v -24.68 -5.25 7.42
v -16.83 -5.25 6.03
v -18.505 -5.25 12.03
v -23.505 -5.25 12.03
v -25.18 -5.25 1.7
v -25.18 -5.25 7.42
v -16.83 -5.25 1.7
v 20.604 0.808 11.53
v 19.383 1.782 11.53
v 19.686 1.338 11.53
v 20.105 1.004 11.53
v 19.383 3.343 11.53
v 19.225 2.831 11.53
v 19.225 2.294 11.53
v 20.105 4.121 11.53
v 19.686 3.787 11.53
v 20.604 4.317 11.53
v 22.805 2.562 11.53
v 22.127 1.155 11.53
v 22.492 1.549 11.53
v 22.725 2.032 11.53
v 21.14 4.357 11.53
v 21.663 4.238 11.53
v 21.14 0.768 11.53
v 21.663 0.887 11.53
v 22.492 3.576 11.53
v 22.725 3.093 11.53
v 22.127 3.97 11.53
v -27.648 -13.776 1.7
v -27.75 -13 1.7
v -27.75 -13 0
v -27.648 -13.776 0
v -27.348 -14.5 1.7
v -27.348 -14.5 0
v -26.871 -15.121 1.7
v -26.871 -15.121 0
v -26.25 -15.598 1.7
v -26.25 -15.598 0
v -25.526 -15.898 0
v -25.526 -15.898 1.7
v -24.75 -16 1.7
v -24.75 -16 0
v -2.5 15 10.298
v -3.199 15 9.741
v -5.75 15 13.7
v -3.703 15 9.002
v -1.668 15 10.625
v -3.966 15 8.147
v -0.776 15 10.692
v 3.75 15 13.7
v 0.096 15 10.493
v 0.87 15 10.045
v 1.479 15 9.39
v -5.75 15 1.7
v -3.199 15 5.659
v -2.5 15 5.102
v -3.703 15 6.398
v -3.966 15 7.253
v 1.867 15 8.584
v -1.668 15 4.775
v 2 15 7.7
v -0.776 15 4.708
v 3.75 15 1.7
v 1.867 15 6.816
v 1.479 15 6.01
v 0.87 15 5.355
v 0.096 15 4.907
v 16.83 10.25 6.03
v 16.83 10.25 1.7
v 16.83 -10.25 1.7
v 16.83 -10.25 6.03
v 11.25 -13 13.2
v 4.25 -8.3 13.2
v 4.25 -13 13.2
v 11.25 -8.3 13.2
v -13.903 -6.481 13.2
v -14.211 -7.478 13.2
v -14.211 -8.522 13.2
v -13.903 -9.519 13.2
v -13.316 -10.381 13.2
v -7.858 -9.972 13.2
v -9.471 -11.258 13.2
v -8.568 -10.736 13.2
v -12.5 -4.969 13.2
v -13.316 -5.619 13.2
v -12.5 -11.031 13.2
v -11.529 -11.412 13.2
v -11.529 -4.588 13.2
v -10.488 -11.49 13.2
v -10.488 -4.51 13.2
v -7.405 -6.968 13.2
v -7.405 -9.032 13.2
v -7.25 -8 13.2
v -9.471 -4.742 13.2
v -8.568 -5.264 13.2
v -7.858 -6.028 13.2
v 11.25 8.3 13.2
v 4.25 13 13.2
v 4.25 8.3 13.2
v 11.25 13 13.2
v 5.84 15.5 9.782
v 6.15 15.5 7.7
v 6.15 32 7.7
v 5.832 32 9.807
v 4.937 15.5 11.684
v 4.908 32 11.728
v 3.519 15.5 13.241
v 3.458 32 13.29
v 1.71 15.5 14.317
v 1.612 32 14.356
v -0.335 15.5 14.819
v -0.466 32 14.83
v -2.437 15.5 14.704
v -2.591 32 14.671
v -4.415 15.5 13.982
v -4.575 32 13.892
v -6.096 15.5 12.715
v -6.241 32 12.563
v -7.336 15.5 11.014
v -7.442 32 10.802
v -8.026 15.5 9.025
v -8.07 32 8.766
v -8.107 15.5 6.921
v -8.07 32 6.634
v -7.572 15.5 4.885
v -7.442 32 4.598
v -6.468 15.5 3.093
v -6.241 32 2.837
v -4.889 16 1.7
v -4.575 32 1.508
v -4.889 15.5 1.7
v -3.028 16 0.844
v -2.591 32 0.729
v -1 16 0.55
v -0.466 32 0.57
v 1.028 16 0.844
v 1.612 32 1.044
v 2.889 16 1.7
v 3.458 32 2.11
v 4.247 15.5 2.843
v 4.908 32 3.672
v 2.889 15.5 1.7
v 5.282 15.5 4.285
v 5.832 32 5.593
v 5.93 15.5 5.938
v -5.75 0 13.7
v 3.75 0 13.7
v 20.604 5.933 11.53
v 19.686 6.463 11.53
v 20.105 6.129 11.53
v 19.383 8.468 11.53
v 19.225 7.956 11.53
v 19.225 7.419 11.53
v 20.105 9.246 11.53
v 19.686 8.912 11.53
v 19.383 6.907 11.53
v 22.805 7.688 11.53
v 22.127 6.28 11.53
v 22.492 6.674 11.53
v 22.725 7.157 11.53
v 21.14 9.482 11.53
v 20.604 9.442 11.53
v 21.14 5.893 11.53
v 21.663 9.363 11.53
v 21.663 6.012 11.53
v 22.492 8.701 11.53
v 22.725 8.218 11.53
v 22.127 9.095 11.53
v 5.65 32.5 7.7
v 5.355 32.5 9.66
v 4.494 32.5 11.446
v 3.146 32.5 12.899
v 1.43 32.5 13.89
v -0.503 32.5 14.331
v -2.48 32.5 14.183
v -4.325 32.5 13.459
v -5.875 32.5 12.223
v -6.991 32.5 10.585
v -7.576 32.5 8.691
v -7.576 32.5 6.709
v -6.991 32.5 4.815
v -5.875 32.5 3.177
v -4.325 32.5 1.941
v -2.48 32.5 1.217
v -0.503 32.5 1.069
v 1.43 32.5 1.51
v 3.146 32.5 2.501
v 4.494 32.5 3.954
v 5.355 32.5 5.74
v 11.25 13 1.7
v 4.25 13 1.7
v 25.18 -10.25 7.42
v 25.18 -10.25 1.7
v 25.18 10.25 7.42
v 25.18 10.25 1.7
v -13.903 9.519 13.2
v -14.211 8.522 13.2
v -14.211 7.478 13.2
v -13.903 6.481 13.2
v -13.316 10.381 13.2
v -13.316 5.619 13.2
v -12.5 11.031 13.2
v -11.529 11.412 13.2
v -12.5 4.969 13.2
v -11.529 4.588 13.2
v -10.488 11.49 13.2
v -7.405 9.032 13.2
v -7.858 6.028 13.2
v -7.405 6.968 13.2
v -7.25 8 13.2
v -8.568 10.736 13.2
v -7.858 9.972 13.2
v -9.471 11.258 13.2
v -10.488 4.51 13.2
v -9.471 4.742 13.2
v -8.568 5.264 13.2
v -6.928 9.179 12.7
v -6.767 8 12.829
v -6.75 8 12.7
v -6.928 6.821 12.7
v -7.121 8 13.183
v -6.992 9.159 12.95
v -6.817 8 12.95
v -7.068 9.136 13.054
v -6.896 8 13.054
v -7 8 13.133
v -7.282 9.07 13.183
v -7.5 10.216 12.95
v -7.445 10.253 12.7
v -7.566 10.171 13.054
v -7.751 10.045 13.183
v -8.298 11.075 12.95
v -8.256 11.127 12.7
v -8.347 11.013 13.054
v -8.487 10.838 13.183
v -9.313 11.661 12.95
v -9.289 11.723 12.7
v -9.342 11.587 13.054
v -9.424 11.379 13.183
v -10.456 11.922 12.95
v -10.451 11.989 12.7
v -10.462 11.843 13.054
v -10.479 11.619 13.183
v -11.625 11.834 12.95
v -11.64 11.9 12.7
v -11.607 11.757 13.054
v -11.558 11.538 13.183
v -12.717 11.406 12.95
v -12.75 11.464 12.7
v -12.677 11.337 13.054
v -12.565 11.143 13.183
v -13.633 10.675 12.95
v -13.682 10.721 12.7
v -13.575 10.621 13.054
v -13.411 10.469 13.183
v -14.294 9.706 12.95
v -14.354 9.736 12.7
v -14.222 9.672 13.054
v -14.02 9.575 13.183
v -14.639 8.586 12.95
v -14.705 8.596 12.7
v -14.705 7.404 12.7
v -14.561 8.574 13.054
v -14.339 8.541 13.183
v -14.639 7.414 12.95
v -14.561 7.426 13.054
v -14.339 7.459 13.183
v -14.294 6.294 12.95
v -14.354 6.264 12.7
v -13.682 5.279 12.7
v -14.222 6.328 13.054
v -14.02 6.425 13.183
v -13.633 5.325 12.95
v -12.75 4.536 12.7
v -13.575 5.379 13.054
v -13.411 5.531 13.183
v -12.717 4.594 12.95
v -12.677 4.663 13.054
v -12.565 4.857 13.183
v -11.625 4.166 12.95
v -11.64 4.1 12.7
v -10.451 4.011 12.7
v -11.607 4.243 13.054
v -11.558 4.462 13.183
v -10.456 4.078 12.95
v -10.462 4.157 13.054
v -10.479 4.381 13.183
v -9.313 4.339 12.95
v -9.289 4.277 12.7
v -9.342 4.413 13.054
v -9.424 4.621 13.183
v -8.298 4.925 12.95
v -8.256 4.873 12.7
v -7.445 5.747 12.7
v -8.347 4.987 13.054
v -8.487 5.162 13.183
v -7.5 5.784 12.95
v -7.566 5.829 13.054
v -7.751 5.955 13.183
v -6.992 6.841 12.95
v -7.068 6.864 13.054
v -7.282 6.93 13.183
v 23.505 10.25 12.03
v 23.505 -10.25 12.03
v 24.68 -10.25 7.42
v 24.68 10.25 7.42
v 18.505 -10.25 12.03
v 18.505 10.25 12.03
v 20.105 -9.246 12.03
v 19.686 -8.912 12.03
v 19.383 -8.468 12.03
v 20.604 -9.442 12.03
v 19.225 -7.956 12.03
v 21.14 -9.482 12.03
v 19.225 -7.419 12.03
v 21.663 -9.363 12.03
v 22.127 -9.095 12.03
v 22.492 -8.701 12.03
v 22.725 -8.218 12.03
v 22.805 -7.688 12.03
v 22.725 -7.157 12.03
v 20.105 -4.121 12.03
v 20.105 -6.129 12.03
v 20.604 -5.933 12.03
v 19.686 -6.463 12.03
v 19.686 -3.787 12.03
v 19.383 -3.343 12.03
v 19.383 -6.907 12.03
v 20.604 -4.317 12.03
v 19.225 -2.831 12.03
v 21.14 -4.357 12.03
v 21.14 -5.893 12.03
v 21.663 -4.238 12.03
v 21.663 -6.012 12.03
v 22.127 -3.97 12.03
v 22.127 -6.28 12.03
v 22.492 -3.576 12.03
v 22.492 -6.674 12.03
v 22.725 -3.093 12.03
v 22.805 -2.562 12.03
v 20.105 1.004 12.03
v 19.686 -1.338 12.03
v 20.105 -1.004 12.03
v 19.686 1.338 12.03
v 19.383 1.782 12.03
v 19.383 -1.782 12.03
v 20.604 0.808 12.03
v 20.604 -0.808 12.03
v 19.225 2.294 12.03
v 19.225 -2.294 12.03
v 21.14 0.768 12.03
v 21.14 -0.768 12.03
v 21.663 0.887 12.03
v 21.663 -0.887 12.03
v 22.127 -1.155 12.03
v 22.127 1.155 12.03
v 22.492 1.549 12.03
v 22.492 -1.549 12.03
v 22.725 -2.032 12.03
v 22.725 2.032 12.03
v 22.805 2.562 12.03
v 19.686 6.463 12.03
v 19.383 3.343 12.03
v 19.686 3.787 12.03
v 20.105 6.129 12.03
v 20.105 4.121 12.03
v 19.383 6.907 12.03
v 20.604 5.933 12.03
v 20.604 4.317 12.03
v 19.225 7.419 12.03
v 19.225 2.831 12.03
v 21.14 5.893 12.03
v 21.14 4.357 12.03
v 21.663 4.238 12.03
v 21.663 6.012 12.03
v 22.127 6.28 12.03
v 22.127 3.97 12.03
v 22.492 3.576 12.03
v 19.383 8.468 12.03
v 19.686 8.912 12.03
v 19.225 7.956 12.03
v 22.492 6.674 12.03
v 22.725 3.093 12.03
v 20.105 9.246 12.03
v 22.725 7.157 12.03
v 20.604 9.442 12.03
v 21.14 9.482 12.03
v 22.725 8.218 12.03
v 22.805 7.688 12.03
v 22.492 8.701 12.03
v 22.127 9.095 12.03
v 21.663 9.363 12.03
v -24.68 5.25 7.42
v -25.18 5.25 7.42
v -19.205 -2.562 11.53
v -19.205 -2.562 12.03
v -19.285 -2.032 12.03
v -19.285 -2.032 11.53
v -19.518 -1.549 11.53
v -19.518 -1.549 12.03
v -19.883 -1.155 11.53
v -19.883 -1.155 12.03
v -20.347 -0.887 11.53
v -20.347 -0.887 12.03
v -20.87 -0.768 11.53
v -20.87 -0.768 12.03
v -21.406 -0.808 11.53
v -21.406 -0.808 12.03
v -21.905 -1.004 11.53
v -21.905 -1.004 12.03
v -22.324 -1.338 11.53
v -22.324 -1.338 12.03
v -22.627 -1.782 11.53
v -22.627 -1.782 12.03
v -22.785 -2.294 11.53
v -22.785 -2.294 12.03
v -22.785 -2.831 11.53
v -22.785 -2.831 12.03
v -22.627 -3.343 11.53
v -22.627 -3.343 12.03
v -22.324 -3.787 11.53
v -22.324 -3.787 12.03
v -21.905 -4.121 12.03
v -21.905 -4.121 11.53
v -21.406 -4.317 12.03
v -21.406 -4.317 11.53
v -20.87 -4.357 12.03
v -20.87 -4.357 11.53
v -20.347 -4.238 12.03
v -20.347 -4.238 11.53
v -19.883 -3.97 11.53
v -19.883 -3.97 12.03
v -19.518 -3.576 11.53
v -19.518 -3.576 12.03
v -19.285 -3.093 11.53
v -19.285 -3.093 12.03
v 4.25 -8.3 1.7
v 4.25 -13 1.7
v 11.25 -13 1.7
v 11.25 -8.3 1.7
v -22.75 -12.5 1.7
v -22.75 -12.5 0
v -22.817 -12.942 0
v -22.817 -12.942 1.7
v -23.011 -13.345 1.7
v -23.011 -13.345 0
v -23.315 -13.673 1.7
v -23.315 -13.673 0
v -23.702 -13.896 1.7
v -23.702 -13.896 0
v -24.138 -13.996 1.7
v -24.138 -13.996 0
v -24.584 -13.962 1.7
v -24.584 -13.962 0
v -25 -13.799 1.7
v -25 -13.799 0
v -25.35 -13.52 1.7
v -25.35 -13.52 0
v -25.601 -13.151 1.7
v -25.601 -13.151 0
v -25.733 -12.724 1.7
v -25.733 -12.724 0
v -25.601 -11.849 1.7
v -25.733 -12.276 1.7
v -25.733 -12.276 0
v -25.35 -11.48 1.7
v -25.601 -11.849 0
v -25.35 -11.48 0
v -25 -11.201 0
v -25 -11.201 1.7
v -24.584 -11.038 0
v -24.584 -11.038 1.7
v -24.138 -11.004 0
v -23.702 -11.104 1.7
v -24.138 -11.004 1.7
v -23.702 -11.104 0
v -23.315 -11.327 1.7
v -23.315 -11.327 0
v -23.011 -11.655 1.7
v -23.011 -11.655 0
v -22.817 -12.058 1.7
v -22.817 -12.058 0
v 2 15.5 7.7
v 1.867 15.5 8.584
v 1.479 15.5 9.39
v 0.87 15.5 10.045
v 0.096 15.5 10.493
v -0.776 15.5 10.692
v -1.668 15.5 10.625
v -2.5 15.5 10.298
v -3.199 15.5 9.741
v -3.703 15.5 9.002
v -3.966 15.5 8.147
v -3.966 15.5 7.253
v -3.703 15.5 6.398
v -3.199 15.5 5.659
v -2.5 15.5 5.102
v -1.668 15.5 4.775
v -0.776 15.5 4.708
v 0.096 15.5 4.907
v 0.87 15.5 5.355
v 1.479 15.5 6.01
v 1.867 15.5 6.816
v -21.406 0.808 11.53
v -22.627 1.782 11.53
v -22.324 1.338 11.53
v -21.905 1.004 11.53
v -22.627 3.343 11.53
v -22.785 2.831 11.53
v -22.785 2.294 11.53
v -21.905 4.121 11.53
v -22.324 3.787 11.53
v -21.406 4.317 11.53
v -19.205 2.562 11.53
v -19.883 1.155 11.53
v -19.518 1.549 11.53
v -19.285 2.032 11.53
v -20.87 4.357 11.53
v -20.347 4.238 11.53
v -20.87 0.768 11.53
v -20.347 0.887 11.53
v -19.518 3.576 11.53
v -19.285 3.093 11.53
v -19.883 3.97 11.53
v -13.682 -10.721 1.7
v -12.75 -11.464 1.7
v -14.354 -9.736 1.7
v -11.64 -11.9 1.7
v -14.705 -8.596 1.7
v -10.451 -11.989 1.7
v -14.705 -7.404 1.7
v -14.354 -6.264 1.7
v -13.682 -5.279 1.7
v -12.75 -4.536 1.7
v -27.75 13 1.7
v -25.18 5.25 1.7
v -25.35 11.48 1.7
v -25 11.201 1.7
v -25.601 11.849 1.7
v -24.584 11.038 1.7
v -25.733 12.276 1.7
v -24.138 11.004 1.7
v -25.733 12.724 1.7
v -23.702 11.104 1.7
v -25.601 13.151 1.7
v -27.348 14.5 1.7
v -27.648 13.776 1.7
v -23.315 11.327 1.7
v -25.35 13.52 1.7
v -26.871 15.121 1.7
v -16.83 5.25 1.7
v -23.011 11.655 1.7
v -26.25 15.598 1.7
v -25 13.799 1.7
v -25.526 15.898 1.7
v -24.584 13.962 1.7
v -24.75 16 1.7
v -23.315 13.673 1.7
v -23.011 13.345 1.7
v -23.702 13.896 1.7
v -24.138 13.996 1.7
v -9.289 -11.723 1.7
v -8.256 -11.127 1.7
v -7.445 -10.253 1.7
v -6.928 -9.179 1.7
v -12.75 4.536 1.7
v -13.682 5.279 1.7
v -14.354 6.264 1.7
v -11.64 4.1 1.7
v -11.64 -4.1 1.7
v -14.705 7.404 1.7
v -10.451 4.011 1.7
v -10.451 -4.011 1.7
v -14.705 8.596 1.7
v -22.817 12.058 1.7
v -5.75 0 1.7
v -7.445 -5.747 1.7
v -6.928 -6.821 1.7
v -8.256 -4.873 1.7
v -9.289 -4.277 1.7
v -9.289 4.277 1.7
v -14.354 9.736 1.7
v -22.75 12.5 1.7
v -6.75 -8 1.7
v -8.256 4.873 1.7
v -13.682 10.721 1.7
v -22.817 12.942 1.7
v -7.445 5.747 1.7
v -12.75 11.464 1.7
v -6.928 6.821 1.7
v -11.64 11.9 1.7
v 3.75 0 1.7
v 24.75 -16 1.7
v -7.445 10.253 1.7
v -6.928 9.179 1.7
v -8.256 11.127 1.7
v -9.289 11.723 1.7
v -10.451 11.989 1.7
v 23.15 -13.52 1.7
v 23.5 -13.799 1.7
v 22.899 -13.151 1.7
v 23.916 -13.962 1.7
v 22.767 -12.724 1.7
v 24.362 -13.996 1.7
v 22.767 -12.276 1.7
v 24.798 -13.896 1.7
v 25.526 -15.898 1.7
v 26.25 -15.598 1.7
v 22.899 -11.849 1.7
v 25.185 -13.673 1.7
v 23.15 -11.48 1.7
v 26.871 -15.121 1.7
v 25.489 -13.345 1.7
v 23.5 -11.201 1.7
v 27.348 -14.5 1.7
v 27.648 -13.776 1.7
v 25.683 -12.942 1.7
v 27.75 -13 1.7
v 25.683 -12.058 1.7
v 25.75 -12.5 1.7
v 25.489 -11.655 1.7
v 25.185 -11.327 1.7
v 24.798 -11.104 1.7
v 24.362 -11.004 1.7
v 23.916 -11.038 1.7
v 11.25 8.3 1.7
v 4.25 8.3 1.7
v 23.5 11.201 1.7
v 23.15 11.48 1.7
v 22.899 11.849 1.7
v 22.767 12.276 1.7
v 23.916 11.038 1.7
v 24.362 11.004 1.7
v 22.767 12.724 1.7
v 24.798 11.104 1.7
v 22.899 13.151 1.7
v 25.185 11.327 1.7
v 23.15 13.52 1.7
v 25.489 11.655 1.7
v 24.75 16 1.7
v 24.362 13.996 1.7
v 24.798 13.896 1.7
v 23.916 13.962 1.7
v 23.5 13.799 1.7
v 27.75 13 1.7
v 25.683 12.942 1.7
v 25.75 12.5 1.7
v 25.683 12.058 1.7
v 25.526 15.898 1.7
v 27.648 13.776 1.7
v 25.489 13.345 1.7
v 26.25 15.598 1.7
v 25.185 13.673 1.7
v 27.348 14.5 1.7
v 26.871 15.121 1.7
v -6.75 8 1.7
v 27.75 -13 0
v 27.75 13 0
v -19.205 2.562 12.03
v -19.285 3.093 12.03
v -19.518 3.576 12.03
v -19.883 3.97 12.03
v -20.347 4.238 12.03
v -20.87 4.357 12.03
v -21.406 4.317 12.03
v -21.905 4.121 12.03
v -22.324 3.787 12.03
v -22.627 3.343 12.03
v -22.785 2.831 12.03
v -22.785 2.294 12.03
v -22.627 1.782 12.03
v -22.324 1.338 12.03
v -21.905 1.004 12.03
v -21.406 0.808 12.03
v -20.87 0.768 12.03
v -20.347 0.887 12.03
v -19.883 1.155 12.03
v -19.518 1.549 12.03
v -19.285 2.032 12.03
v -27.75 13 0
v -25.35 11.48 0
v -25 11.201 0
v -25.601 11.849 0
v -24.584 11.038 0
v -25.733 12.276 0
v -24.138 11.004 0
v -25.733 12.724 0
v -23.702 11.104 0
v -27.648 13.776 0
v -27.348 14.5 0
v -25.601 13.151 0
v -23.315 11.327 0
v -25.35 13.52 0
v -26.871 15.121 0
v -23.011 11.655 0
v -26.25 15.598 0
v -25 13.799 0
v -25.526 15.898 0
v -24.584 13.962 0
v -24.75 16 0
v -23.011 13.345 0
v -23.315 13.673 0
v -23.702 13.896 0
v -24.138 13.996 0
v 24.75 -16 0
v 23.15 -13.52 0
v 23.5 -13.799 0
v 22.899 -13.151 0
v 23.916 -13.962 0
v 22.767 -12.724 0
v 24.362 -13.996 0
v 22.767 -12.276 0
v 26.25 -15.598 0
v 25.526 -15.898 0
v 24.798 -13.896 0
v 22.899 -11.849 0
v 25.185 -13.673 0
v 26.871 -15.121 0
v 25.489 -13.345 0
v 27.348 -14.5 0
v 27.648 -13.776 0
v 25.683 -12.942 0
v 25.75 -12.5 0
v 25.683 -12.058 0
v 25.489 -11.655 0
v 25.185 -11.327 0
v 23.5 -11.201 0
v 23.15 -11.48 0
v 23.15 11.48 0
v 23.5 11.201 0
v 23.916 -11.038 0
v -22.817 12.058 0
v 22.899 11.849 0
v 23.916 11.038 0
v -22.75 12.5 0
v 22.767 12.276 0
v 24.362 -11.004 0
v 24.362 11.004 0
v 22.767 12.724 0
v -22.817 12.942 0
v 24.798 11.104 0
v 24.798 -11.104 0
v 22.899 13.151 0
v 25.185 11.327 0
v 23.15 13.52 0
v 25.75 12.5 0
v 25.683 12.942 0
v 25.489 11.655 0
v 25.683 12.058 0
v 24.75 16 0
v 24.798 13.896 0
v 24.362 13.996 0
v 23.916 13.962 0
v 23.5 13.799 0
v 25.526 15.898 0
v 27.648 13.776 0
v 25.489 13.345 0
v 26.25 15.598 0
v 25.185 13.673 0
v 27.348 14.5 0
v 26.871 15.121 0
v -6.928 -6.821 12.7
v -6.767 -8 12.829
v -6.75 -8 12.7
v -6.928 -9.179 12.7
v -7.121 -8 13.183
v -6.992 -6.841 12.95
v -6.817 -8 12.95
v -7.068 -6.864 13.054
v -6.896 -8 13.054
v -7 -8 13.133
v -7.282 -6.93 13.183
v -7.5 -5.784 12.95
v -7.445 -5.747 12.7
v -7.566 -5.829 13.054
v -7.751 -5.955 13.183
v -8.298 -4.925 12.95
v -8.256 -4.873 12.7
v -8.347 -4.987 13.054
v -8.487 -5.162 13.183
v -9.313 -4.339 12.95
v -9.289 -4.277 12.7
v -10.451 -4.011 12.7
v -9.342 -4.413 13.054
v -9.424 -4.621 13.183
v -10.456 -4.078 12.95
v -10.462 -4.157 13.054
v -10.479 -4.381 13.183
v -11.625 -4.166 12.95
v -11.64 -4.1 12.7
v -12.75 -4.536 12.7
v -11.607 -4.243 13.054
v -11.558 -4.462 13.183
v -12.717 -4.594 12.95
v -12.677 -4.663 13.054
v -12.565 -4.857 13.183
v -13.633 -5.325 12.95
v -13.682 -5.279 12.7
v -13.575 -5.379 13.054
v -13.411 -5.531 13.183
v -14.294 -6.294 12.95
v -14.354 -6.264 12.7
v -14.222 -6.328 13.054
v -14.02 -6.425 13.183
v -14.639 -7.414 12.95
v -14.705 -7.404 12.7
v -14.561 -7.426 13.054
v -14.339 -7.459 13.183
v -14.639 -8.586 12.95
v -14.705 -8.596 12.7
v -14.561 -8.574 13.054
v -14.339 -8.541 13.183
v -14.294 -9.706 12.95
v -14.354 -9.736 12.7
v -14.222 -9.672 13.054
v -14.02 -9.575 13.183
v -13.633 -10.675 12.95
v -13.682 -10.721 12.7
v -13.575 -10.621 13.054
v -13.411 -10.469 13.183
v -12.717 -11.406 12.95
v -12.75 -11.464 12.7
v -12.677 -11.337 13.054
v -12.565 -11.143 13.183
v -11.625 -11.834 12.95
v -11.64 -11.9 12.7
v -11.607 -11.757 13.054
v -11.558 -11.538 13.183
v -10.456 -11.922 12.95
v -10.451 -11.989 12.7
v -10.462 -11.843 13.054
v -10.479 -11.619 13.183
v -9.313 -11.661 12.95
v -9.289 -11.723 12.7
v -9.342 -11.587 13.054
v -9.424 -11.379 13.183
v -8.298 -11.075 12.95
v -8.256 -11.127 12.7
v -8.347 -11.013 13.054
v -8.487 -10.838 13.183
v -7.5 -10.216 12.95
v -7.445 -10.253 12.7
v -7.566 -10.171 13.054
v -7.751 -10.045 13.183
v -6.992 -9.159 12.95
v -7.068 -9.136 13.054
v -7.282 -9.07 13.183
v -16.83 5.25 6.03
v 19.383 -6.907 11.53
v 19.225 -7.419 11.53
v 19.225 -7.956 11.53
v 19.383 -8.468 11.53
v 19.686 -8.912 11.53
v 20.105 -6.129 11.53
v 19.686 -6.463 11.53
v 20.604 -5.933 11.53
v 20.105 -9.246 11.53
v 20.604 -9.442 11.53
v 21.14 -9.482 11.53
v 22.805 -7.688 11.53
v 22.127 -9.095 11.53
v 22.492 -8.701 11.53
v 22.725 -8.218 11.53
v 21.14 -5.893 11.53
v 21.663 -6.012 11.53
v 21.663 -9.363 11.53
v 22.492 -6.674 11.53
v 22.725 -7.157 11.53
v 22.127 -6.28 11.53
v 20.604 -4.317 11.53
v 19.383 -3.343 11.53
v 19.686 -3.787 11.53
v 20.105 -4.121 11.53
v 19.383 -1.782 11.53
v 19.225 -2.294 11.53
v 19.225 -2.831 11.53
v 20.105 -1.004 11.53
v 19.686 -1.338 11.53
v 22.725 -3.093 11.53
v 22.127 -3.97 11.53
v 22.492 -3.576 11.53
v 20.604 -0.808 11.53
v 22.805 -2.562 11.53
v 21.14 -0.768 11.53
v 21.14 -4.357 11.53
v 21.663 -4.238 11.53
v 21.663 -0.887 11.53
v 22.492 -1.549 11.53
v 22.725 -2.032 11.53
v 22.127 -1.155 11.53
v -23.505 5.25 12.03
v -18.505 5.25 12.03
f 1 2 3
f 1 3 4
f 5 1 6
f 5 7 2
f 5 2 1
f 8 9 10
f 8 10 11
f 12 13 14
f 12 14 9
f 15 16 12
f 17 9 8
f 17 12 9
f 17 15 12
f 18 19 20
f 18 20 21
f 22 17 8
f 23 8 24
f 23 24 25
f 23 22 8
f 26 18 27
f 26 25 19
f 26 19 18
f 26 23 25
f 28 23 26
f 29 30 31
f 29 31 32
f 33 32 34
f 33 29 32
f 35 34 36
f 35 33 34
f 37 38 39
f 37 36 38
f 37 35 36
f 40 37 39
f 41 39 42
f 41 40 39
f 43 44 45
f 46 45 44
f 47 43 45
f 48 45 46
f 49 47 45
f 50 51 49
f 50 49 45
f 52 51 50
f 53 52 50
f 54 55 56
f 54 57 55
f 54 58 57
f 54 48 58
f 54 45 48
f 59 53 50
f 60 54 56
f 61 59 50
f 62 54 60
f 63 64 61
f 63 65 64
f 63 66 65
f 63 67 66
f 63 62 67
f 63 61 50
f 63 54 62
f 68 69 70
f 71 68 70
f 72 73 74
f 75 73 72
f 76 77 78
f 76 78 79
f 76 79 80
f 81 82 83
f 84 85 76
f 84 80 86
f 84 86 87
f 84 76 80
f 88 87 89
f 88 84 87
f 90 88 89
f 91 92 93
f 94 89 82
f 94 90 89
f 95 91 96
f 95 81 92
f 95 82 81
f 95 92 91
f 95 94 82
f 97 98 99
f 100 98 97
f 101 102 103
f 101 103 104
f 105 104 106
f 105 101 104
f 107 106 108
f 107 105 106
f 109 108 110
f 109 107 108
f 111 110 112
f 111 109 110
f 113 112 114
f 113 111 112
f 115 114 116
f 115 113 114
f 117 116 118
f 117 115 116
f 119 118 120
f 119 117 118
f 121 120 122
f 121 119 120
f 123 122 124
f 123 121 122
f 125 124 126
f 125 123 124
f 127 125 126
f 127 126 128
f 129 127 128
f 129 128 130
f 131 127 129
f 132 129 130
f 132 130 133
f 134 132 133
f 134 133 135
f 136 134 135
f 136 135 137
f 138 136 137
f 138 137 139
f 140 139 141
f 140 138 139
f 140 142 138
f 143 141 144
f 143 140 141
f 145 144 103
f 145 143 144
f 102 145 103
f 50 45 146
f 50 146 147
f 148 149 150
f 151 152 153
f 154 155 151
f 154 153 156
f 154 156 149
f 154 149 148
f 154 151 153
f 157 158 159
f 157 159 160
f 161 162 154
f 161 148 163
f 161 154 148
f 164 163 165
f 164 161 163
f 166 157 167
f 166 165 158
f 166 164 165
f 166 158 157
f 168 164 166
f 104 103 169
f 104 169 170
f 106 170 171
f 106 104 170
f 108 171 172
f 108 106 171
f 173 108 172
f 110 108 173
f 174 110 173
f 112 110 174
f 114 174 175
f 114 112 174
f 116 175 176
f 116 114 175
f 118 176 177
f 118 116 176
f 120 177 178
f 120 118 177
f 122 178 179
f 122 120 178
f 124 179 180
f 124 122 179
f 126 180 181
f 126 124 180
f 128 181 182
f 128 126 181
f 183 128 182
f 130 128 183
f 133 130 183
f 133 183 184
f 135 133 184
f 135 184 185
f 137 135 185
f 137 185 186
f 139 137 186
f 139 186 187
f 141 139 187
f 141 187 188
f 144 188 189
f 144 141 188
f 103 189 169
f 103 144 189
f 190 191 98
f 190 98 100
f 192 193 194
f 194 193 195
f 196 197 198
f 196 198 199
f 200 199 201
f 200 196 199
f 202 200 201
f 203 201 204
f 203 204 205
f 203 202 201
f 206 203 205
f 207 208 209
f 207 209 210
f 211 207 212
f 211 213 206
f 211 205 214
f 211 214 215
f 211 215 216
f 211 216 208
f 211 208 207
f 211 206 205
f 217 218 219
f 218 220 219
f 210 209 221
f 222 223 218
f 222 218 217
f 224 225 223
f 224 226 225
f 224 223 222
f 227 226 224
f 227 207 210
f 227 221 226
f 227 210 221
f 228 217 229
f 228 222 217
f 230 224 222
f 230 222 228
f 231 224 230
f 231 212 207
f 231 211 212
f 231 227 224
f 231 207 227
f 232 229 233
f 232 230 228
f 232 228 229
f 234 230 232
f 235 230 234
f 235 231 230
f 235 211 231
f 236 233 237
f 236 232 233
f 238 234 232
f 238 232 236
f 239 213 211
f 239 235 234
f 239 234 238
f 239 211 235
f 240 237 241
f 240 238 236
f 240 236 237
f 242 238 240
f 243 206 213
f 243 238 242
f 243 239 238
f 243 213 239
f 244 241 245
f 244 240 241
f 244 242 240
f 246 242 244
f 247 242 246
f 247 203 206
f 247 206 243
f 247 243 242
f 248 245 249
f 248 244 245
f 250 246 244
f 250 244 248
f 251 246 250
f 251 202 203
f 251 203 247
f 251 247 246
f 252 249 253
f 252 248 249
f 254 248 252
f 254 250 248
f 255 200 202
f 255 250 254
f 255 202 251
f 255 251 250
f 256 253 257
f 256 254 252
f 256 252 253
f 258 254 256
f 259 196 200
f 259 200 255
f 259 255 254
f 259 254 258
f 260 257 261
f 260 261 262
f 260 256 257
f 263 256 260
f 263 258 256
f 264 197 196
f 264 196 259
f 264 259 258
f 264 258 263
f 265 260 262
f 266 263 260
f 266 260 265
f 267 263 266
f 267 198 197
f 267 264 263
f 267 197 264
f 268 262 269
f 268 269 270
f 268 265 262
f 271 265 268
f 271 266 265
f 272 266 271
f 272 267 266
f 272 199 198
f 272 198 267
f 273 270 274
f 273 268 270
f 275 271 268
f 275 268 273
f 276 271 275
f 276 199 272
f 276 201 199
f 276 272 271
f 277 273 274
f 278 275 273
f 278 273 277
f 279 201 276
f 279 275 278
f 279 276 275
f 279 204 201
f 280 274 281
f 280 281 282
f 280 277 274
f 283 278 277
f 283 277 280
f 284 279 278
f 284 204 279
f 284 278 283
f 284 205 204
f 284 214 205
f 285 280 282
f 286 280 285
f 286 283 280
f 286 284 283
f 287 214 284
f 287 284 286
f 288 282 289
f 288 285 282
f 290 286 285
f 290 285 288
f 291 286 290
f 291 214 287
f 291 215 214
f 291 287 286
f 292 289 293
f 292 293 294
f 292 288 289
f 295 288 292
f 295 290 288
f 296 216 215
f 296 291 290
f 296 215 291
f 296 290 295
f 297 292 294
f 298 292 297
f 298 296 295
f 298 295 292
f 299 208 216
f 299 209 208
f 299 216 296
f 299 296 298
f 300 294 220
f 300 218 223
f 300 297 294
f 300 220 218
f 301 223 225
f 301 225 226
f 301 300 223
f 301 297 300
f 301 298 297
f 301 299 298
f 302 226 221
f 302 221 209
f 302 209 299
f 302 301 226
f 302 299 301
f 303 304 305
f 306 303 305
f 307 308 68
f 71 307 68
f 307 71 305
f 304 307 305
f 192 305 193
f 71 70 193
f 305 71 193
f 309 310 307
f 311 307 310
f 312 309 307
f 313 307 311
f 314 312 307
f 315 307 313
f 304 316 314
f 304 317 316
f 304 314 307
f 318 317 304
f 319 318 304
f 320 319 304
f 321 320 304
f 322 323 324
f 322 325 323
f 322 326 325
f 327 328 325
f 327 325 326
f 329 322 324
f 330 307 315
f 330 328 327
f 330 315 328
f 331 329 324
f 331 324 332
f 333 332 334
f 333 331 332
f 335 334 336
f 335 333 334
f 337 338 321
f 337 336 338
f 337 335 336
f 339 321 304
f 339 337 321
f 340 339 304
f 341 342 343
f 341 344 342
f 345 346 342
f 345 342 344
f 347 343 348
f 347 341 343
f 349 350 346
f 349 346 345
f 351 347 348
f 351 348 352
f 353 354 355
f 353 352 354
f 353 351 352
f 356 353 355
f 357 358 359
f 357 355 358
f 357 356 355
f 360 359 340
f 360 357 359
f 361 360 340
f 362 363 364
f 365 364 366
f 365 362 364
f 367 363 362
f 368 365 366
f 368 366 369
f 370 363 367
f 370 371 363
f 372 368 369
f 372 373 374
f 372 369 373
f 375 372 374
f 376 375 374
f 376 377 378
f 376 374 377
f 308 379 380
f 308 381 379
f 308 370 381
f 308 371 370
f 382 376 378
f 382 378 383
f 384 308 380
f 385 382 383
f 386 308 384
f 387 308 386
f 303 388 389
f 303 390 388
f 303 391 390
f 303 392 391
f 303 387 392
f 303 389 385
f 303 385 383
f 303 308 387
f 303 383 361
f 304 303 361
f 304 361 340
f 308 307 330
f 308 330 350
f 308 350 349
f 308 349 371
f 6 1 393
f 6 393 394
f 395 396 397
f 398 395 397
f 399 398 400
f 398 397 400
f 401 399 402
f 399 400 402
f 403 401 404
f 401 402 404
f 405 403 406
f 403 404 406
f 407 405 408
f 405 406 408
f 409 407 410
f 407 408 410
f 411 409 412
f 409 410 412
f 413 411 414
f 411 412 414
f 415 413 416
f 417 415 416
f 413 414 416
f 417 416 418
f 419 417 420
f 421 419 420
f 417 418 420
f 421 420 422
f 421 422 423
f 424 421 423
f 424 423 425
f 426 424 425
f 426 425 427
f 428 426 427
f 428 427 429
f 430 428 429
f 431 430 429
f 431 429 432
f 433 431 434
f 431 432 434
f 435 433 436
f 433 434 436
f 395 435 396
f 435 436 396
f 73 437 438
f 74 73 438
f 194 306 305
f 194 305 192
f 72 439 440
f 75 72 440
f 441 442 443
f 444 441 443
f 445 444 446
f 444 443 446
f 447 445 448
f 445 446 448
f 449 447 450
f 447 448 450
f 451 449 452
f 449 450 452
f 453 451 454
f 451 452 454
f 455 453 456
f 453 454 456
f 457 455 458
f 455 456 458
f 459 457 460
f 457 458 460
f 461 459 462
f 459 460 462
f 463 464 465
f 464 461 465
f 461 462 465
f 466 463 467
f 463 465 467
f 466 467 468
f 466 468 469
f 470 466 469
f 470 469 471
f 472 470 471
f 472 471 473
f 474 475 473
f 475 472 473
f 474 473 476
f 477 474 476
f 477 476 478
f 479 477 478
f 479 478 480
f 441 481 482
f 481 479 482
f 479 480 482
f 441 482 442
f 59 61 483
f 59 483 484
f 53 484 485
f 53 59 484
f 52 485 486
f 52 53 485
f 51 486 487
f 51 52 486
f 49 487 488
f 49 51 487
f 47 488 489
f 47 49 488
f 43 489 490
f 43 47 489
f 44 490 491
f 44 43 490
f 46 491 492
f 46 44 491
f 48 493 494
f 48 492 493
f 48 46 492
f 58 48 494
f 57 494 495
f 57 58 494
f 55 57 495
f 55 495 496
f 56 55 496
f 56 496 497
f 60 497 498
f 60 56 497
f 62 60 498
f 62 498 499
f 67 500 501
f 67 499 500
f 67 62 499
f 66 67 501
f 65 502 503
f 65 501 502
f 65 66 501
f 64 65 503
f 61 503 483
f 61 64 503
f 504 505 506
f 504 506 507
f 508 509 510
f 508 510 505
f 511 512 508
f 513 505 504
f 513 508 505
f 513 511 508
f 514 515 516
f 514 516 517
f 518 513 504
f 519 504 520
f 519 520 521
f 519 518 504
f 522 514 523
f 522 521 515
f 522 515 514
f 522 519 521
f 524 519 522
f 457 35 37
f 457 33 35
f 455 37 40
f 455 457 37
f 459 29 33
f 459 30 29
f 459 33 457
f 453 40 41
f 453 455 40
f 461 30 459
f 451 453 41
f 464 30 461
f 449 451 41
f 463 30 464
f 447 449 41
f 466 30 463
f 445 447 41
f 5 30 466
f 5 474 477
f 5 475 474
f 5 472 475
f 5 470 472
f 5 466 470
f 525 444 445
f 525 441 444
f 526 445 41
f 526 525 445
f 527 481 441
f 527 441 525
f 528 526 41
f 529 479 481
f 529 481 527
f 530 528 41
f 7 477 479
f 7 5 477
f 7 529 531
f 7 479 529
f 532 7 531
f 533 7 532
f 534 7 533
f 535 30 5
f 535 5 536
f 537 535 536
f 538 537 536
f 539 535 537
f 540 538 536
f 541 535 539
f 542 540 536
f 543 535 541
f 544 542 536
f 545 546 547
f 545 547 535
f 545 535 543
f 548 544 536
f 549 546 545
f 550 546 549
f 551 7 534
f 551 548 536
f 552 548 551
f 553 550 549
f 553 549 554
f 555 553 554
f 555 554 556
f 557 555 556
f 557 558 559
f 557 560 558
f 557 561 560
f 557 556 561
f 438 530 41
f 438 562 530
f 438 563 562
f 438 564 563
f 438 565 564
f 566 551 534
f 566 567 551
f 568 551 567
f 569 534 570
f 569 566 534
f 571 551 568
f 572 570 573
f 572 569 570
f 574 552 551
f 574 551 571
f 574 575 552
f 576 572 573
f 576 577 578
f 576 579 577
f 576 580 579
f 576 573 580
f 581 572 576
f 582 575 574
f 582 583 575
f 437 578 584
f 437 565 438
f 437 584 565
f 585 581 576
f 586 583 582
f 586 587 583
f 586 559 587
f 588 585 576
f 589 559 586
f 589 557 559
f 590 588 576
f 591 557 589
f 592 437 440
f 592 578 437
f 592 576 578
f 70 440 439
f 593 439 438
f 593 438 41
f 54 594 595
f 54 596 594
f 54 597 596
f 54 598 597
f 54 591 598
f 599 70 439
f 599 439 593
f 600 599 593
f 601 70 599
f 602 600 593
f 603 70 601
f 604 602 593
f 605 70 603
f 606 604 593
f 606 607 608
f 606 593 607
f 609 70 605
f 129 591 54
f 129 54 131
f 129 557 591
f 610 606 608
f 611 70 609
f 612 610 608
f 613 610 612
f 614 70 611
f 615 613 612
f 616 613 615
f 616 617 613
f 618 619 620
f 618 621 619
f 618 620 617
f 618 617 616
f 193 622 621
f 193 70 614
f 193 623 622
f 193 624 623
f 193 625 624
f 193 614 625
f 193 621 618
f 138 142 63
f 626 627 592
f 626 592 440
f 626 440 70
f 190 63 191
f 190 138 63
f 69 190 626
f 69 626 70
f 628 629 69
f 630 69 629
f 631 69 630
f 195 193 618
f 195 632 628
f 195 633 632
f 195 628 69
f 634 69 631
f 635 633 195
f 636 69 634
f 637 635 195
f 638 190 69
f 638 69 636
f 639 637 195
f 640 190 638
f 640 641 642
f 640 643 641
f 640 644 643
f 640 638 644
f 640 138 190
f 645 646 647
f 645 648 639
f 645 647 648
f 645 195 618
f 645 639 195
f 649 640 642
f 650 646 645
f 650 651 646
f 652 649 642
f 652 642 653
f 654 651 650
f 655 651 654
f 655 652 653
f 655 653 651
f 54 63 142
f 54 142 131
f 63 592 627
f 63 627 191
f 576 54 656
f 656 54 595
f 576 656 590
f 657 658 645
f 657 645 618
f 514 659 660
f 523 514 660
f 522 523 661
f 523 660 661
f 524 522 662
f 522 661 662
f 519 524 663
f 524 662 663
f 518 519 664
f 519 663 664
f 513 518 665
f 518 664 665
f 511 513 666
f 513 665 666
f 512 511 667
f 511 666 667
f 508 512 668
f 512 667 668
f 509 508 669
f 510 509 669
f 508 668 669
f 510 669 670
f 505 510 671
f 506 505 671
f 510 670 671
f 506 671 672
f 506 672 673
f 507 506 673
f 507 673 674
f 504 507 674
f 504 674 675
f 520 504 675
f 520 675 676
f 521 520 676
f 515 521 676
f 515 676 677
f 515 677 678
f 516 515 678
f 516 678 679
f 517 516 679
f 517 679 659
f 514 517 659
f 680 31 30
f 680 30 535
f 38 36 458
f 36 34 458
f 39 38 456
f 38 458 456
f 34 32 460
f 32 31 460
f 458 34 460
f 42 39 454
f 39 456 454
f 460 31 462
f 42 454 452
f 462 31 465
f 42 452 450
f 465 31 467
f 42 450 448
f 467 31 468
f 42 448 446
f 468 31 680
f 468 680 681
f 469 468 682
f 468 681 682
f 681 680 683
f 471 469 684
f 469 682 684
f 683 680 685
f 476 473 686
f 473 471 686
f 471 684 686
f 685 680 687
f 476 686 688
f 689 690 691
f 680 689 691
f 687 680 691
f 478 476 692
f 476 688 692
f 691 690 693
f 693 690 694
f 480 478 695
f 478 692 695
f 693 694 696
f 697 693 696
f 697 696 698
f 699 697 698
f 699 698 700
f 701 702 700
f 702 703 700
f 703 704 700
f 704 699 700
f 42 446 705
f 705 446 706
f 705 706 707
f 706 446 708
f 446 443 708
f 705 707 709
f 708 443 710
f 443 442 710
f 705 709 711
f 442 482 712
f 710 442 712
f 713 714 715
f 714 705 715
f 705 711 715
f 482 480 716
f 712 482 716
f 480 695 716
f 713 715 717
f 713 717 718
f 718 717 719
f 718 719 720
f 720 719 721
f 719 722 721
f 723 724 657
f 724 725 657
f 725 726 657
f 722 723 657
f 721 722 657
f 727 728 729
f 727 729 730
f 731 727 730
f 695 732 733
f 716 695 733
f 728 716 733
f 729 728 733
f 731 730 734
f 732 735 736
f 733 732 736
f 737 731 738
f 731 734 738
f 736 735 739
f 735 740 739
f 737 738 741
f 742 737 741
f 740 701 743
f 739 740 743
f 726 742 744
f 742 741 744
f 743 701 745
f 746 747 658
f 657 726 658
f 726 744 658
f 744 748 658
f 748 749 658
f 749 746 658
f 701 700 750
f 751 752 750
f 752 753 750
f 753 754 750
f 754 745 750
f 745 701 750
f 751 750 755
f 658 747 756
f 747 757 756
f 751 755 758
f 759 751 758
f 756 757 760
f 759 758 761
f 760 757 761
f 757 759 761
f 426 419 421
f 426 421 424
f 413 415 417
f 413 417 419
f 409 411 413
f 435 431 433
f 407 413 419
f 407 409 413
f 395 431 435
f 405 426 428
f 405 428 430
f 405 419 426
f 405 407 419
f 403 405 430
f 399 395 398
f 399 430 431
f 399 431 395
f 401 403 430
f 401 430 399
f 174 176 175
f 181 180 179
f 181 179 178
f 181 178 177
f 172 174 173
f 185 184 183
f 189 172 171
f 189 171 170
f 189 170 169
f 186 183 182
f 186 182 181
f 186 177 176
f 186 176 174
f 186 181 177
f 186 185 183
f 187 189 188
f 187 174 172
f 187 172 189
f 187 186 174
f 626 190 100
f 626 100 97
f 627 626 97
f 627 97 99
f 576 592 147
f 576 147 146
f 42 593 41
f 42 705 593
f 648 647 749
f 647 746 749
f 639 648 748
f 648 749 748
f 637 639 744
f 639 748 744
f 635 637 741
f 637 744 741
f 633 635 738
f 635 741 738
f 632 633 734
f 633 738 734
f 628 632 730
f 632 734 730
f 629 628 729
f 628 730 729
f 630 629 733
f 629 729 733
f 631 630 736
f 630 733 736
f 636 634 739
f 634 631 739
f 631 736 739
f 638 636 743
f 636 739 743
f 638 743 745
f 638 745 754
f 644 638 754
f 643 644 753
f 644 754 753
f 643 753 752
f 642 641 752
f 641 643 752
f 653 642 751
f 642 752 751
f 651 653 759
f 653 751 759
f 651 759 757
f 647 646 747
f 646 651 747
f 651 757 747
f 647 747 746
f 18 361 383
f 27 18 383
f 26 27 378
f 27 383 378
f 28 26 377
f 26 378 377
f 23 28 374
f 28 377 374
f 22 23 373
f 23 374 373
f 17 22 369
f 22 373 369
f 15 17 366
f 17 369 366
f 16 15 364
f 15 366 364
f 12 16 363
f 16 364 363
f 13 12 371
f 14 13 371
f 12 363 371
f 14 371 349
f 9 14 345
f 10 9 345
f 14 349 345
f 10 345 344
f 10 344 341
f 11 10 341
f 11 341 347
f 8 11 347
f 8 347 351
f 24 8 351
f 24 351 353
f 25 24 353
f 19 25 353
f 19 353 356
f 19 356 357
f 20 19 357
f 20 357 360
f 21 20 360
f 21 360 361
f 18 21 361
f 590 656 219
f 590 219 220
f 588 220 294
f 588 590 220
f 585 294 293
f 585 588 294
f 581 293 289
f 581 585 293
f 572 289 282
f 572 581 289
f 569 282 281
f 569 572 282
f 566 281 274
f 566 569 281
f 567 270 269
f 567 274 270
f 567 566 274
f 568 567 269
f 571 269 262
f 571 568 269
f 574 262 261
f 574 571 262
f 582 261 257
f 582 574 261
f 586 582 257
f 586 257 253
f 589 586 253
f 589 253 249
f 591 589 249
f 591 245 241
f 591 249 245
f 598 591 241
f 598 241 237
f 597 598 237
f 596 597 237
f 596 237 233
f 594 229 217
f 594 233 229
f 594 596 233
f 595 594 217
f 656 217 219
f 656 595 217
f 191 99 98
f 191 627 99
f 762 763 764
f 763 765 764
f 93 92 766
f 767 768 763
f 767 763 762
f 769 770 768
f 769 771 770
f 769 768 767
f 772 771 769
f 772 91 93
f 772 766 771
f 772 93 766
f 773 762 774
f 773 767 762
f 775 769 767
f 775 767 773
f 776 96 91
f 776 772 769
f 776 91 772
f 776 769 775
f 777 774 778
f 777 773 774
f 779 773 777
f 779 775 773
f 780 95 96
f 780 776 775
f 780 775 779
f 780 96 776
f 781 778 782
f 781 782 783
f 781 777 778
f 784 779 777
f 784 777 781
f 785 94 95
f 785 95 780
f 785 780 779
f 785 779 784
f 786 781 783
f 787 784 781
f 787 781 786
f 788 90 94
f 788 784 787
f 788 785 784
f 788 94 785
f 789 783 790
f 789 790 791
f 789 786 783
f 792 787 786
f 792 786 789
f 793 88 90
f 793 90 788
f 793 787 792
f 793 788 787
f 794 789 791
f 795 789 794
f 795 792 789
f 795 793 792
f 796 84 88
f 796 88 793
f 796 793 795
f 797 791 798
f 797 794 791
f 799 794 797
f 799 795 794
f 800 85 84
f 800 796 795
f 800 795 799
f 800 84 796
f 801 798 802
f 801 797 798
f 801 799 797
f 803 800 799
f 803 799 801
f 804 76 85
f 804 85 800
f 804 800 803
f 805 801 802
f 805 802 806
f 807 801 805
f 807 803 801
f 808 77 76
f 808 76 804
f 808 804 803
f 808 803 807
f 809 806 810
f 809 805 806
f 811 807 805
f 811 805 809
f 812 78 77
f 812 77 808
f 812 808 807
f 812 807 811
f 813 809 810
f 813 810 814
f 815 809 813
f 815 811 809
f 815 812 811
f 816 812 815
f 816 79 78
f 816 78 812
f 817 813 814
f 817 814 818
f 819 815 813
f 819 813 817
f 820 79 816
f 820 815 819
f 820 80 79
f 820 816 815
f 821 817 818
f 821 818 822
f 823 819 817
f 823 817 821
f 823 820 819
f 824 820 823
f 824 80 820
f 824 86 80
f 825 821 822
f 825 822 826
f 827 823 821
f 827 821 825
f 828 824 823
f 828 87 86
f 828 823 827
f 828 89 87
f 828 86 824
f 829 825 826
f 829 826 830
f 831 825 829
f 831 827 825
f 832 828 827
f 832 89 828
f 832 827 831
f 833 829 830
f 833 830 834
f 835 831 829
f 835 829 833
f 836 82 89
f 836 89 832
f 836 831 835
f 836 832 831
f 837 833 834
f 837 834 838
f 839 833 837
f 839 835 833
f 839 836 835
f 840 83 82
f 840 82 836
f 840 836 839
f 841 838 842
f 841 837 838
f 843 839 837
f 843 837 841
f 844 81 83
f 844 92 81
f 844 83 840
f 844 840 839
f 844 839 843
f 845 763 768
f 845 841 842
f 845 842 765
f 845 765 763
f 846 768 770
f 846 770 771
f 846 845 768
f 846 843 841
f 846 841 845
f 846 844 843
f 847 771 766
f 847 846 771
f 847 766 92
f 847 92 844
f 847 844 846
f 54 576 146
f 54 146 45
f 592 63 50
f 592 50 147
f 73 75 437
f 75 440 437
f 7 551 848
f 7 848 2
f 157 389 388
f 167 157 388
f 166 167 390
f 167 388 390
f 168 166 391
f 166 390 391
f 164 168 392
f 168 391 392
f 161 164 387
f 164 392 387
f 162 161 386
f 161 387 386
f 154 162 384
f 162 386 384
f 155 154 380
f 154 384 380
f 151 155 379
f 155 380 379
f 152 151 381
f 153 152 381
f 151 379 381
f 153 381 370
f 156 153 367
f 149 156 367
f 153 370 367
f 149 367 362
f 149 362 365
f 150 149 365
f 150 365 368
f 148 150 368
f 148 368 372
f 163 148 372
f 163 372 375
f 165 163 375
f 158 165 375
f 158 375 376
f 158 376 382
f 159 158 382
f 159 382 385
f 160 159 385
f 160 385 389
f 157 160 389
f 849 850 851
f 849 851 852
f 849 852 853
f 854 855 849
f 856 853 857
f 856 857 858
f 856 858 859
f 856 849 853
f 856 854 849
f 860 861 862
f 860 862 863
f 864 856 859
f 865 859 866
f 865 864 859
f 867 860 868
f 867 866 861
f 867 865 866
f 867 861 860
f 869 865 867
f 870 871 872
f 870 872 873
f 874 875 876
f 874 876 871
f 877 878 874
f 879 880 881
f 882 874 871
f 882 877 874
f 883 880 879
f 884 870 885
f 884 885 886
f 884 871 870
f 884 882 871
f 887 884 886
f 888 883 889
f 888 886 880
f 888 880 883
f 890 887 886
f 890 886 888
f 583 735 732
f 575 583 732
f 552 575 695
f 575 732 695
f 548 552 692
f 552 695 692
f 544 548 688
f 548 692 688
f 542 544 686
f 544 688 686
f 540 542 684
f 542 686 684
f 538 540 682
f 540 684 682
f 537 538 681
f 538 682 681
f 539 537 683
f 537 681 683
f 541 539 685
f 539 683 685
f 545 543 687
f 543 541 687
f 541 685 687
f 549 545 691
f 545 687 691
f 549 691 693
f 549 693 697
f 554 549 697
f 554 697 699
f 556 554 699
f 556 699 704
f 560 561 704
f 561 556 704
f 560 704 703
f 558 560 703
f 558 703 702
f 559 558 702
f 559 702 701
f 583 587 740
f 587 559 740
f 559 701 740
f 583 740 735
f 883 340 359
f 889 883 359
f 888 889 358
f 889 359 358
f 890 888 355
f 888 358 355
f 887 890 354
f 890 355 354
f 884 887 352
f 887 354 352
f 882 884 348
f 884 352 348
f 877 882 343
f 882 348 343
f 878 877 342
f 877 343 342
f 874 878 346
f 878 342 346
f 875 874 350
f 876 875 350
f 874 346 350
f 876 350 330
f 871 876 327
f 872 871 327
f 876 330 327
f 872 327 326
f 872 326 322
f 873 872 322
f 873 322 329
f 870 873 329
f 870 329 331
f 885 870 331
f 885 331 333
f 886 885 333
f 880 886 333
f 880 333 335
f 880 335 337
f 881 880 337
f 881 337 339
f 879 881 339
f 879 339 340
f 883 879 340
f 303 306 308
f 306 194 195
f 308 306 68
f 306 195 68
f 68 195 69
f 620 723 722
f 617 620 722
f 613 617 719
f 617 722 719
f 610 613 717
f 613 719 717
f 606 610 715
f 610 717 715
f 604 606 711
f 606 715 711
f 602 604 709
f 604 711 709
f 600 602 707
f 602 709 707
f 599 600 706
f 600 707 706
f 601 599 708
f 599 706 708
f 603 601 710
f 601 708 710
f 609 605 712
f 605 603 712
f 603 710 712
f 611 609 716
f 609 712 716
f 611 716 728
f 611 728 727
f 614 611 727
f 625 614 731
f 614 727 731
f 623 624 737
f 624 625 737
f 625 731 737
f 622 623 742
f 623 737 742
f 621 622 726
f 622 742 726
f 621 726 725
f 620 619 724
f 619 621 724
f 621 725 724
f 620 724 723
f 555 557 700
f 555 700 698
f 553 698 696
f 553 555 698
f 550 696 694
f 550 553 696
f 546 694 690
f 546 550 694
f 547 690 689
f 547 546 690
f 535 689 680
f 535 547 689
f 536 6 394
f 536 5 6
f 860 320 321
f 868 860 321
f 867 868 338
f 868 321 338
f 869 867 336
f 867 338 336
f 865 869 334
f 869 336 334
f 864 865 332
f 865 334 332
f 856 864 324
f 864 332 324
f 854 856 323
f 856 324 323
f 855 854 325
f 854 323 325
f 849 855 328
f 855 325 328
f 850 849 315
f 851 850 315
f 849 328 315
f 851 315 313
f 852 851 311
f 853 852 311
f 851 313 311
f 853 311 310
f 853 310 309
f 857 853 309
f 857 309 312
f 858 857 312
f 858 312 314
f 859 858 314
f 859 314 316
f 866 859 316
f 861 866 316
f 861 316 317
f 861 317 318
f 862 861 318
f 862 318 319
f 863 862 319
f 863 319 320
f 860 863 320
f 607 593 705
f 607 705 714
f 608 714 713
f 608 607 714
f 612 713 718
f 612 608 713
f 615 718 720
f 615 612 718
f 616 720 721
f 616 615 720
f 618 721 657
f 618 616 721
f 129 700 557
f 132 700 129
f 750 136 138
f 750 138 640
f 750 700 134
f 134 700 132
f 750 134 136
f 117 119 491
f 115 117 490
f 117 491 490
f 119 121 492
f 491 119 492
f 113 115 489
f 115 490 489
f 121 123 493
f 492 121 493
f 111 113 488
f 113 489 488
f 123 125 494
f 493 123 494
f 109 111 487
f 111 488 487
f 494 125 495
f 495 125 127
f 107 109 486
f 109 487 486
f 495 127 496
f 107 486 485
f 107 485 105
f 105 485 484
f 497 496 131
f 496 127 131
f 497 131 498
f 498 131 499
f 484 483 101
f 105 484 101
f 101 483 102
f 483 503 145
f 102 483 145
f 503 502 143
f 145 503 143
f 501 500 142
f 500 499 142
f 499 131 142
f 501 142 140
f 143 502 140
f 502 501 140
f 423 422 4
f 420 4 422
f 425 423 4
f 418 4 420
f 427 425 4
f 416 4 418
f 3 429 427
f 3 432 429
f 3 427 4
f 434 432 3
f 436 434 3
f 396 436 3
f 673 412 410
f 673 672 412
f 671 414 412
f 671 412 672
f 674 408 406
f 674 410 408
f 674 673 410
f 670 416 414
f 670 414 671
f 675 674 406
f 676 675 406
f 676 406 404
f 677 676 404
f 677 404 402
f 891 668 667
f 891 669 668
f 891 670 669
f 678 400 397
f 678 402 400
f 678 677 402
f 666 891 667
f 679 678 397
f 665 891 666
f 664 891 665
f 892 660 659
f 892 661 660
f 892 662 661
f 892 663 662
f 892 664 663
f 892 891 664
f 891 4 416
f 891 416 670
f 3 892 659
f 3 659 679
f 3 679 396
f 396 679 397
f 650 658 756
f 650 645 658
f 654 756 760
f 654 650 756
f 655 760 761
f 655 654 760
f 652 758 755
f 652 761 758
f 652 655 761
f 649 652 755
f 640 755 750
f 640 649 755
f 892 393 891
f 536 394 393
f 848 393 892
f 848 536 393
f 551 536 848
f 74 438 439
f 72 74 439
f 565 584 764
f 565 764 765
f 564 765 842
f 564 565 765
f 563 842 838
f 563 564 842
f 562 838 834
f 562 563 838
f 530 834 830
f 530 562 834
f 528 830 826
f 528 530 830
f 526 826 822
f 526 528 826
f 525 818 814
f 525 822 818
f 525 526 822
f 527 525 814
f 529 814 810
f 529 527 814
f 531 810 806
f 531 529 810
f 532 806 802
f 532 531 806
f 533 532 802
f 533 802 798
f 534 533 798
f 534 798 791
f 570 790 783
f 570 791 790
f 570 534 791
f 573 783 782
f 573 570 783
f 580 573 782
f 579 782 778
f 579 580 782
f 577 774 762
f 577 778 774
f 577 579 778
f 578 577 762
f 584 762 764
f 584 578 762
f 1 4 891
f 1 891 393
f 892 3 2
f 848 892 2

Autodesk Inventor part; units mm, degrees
ref_plane "YZ Plane" through (0, 0, 0) normal (1, 0, 0) x (0, 1, 0)
ref_plane "XZ Plane" through (0, 0, 0) normal (0, 1, 0) x (-1, 0, 0)
ref_plane "XY Plane" through (0, 0, 0) normal (0, 0, 1) x (1, 0, 0)
sketch "Board" plane through (0, 0, 0) normal (0, 0, 1) x (1, 0, 0)
  line L0 (-27.75, 16) -> (27.75, 16)
  line L1 (27.75, 16) -> (27.75, -16)
  line L2 (27.75, -16) -> (-27.75, -16)
  line L3 (-27.75, -16) -> (-27.75, 16)
  line L4 (-27.75, 16) -> (27.75, -16) construction
  line L5 (27.75, 16) -> (-27.75, -16) construction
  line L6 (-24.25, -12.5) -> (24.25, -12.5) construction
  line L7 (24.25, -12.5) -> (24.25, 12.5) construction
  line L8 (24.25, 12.5) -> (-24.25, 12.5) construction
  line L9 (-24.25, 12.5) -> (-24.25, -12.5) construction
  line L10 (-24.25, -12.5) -> (24.25, 12.5) construction
  line L11 (24.25, -12.5) -> (-24.25, 12.5) construction
  circle A0 centre (24.25, 12.5) radius 1.5
  circle A1 centre (-24.25, 12.5) radius 1.5
  circle A2 centre (24.25, -12.5) radius 1.5
  circle A3 centre (-24.25, -12.5) radius 1.5
  line L12 (-25.75, -14) -> (-22.75, -14) construction
  line L13 (-22.75, -14) -> (-22.75, -11) construction
  line L14 (-22.75, -11) -> (-25.75, -11) construction
  line L15 (-25.75, -11) -> (-25.75, -14) construction
  line L16 (-25.75, -14) -> (-22.75, -11) construction
  line L17 (-22.75, -14) -> (-25.75, -11) construction
  point P0 (0, 0)
  dimension "d0" = 55.5
  dimension "d1" = 32
  dimension "d2" = 3
  dimension "d3" = 2
  dimension "d5" = 2
  dimension "d6" = 48.5
extrude "BoardFeature" add sketch "Board" along normal blind 1.7
fillet "BoardFilletsFeature" radius 3 4 edges at (-27.75, 16, 0.85) (27.75, 16, 0.85) (-27.75, -16, 0.85) (27.75, -16, 0.85)
sketch "PotentiometerHousing" plane through (0, 0, 1.7) normal (0, 0, 1) x (1, 0, 0)
  line L0 (-5.75, 15) -> (3.75, 15)
  line L1 (3.75, 15) -> (3.75, 0)
  line L2 (3.75, 0) -> (-5.75, 0)
  line L3 (-5.75, 0) -> (-5.75, 15)
  line L4 (24.75, 16) -> (-24.75, 16) projected
  line L5 (-27.75, 13) -> (-27.75, -13) projected
  point P0 (0, 0)
  dimension "d10" = 1
  dimension "d11" = 22
  dimension "d12" = 15
  dimension "d13" = 9.5
extrude "PotentiometerHousingFeature" add sketch "PotentiometerHousing" along normal blind 12
sketch "IJ63" plane through (0, 0, 1.7) normal (0, 0, 1) x (1, 0, 0)
  line L0 (4.25, 13) -> (11.25, 13)
  line L1 (11.25, 13) -> (11.25, 8.3)
  line L2 (11.25, 8.3) -> (4.25, 8.3)
  line L3 (4.25, 8.3) -> (4.25, 13)
  line L4 (3.75, 15) -> (-5.75, 15) projected
  line L5 (3.75, 0) -> (3.75, 15) projected
  line L6 (-38.85, 0) -> (38.85, 0) construction
  line L7 (4.25, -13) -> (11.25, -13)
  line L8 (11.25, -13) -> (11.25, -8.3)
  line L9 (11.25, -8.3) -> (4.25, -8.3)
  line L10 (4.25, -8.3) -> (4.25, -13)
  point P0 (0, 0)
  dimension "d16" = 2
  dimension "d17" = 4.7
  dimension "d18" = 7
  dimension "d19" = 0.5
extrude "IJ63Feature" add sketch "IJ63" along normal blind 11.5
sketch "Capacitors" plane through (0, 0, 1.7) normal (0, 0, 1) x (1, 0, 0)
  line L0 (-38.85, 0) -> (38.85, 0) construction
  circle A0 centre (-10.75, 8) radius 4
  line L1 (0, -22.4) -> (0, 22.4) construction
  line L2 (-5.75, 15) -> (-5.75, 0) projected
  line L3 (24.75, 16) -> (-24.75, 16) projected
  circle A1 centre (-10.75, -8) radius 4
  point P0 (0, 0)
  dimension "d22" = 8
  dimension "d23" = 5
  dimension "d24" = 8
extrude "CapacitorsFeature" add sketch "Capacitors" along normal blind 11.5
sketch "TerminalBlocks" plane through (0, 0, 1.7) normal (0, 0, 1) x (1, 0, 0)
  line L0 (-38.85, 0) -> (38.85, 0) construction
  line L1 (25.18, 10.25) -> (16.83, 10.25)
  line L2 (16.83, 10.25) -> (16.83, -10.25)
  line L3 (16.83, -10.25) -> (25.18, -10.25)
  line L4 (25.18, -10.25) -> (25.18, 10.25)
  line L5 (-25.18, 5.25) -> (-16.83, 5.25)
  line L6 (-16.83, 5.25) -> (-16.83, -5.25)
  line L7 (-16.83, -5.25) -> (-25.18, -5.25)
  line L8 (-25.18, -5.25) -> (-25.18, 5.25)
  line L9 (27.75, -13) -> (27.75, 13) projected
  line L10 (-27.75, 13) -> (-27.75, -13) projected
  point P0 (0, 0)
  point P1 (25.18, 0)
  point P2 (-16.83, 0)
  dimension "d27" = 8.35
  dimension "d28" = 20.5
  dimension "d29" = 10.5
  dimension "d30" = 2.57
  dimension "d31" = 2.57
extrude "TerminalBlocksFeature" add sketch "TerminalBlocks" along normal blind 10.33
sketch "TerminalBlockProfiles" plane through (16.83, -10.25, 1.7) normal (0, -1, 0) x (1, 0, 0)
  line L0 (8.35, 0) -> (0, 0) projected
  line L1 (8.35, 0) -> (8.35, 10.33) projected
  line L2 (0, 10.33) -> (8.35, 10.33) projected
  line L3 (0, 0) -> (0, 10.33) projected
  line L4 (-33.66, 0) -> (-42.01, 0) projected
  line L5 (-33.66, 0) -> (-33.66, 10.33) projected
  line L6 (-42.01, 10.33) -> (-33.66, 10.33) projected
  line L7 (-42.01, 0) -> (-42.01, 10.33) projected
  line L8 (0, 10.33) -> (8.35, 10.33) projected
  line L9 (1.675, 10.33) -> (0, 4.33)
  line L10 (6.675, 10.33) -> (7.85, 5.72)
  line L11 (7.85, 5.72) -> (8.35, 5.72)
  line L12 (8.35, 0) -> (8.35, 10.33) projected
  line L13 (-16.83, -4.44) -> (-16.83, 14.74) construction
  line L14 (-35.335, 10.33) -> (-33.66, 4.33)
  line L15 (-40.335, 10.33) -> (-41.51, 5.72)
  line L16 (-41.51, 5.72) -> (-42.01, 5.72)
  line L17 (1.675, 10.33) -> (6.675, 10.33)
  point P0 (-16.83, -1.7)
  point P1 (4.175, 10.33)
  point P2 (6.675, 10.33)
  point P3 (1.675, 10.33)
  point P4 (-33.66, 4.33)
  dimension "d34" = 5
  dimension "d35" = 0.5
  dimension "d36" = 4.33
  dimension "d37" = 5.72
extrude "TerminalBlockProfilesFeature" cut sketch "TerminalBlockProfiles" against normal through all contours L11 L10 L2 L1 | L3 L2 L9 | L14 L6 L5 | L7 L6 L15 L16
sketch "TerminalBlockScrews" plane through (0, 0, 12.03) normal (0, 0, 1) x (1, 0, 0)
  line L0 (18.505, 10.25) -> (18.505, -10.25) projected
  line L1 (18.505, -10.25) -> (23.505, -10.25) projected
  line L2 (23.505, -10.25) -> (23.505, 10.25) projected
  line L3 (23.505, 10.25) -> (18.505, 10.25) projected
  line L4 (-18.505, -5.25) -> (-18.505, 5.25) projected
  line L5 (-18.505, 5.25) -> (-23.505, 5.25) projected
  line L6 (-23.505, 5.25) -> (-23.505, -5.25) projected
  line L7 (-23.505, -5.25) -> (-18.505, -5.25) projected
  line L8 (18.505, 0) -> (23.505, 0) construction
  line L9 (18.505, 0) -> (23.505, 10.25) construction
  line L10 (21.005, 5.125) -> (23.505, 5.125) construction
  line L11 (23.505, 5.125) -> (18.505, 10.25) construction
  circle A0 centre (21.005, 7.6875) radius 1.8
  circle A1 centre (21.005, 2.5625) radius 1.8
  circle A2 centre (21.005, -7.6875) radius 1.8
  line L12 (21.005, 7.6875) -> (21.005, -7.6875) construction
  circle A3 centre (21.005, -2.5625) radius 1.8
  line L13 (0, -22.4) -> (0, 22.4) construction
  circle A4 centre (-21.005, 2.5625) radius 1.8
  circle A5 centre (-21.005, -2.5625) radius 1.8
  point P0 (0, 0)
  dimension "d41" = 3.6
  dimension "d42" = 2.5625
  dimension "d43" = 2.5625
extrude "TerminalBlockScrewsFeature" cut sketch "TerminalBlockScrews" against normal blind 0.5 contours A0 | A1 | A2 | A3 | A4 | A5
fillet "FilletsFeature" radius 0.5 2 edges at (-14.75, -8, 13.2) (-14.75, 8, 13.2)
sketch "PotentiometerShaft" plane through (-5.75, 15, 1.7) normal (0, 1, 0) x (1, 0, 0)
  line L0 (0, 0) -> (9.5, 0) projected
  line L1 (0, 0) -> (0, -12) projected
  line L2 (9.5, -12) -> (0, -12) projected
  line L3 (9.5, 0) -> (9.5, -12) projected
  line L4 (9.5, -12) -> (0, 0) construction
  circle A0 centre (4.75, -6) radius 3
  point P0 (5.75, 1.7)
  dimension "d48" = 6
extrude "PotentiometerShaftFeature" add sketch "PotentiometerShaft" along normal blind 0.5 contours A0
sketch "PotentiometerKnob" plane through (-1, 15.5, 7.7) normal (0, 1, 0) x (1, 0, 0)
  circle A0 centre (0, 0) radius 3 projected
  circle A1 centre (0, 0) radius 3 projected
  circle A2 centre (0, 0) radius 7.15
  point P0 (1, 7.7)
  dimension "d51" = 14.3
extrude "PotentiometerKnobFeature" add sketch "PotentiometerKnob" along normal blind 17 contours A0 | A2
chamfer "PotentiometerKnobChamferFeature" distance 0.5 angle 45 1 edges at (-8.15, 32.5, 7.7)
equation "\"d5\" = d3"
equation "\"d31\" = d30"
equation "\"d43\" = d42"
properties part number "LQ-AMP10W"
